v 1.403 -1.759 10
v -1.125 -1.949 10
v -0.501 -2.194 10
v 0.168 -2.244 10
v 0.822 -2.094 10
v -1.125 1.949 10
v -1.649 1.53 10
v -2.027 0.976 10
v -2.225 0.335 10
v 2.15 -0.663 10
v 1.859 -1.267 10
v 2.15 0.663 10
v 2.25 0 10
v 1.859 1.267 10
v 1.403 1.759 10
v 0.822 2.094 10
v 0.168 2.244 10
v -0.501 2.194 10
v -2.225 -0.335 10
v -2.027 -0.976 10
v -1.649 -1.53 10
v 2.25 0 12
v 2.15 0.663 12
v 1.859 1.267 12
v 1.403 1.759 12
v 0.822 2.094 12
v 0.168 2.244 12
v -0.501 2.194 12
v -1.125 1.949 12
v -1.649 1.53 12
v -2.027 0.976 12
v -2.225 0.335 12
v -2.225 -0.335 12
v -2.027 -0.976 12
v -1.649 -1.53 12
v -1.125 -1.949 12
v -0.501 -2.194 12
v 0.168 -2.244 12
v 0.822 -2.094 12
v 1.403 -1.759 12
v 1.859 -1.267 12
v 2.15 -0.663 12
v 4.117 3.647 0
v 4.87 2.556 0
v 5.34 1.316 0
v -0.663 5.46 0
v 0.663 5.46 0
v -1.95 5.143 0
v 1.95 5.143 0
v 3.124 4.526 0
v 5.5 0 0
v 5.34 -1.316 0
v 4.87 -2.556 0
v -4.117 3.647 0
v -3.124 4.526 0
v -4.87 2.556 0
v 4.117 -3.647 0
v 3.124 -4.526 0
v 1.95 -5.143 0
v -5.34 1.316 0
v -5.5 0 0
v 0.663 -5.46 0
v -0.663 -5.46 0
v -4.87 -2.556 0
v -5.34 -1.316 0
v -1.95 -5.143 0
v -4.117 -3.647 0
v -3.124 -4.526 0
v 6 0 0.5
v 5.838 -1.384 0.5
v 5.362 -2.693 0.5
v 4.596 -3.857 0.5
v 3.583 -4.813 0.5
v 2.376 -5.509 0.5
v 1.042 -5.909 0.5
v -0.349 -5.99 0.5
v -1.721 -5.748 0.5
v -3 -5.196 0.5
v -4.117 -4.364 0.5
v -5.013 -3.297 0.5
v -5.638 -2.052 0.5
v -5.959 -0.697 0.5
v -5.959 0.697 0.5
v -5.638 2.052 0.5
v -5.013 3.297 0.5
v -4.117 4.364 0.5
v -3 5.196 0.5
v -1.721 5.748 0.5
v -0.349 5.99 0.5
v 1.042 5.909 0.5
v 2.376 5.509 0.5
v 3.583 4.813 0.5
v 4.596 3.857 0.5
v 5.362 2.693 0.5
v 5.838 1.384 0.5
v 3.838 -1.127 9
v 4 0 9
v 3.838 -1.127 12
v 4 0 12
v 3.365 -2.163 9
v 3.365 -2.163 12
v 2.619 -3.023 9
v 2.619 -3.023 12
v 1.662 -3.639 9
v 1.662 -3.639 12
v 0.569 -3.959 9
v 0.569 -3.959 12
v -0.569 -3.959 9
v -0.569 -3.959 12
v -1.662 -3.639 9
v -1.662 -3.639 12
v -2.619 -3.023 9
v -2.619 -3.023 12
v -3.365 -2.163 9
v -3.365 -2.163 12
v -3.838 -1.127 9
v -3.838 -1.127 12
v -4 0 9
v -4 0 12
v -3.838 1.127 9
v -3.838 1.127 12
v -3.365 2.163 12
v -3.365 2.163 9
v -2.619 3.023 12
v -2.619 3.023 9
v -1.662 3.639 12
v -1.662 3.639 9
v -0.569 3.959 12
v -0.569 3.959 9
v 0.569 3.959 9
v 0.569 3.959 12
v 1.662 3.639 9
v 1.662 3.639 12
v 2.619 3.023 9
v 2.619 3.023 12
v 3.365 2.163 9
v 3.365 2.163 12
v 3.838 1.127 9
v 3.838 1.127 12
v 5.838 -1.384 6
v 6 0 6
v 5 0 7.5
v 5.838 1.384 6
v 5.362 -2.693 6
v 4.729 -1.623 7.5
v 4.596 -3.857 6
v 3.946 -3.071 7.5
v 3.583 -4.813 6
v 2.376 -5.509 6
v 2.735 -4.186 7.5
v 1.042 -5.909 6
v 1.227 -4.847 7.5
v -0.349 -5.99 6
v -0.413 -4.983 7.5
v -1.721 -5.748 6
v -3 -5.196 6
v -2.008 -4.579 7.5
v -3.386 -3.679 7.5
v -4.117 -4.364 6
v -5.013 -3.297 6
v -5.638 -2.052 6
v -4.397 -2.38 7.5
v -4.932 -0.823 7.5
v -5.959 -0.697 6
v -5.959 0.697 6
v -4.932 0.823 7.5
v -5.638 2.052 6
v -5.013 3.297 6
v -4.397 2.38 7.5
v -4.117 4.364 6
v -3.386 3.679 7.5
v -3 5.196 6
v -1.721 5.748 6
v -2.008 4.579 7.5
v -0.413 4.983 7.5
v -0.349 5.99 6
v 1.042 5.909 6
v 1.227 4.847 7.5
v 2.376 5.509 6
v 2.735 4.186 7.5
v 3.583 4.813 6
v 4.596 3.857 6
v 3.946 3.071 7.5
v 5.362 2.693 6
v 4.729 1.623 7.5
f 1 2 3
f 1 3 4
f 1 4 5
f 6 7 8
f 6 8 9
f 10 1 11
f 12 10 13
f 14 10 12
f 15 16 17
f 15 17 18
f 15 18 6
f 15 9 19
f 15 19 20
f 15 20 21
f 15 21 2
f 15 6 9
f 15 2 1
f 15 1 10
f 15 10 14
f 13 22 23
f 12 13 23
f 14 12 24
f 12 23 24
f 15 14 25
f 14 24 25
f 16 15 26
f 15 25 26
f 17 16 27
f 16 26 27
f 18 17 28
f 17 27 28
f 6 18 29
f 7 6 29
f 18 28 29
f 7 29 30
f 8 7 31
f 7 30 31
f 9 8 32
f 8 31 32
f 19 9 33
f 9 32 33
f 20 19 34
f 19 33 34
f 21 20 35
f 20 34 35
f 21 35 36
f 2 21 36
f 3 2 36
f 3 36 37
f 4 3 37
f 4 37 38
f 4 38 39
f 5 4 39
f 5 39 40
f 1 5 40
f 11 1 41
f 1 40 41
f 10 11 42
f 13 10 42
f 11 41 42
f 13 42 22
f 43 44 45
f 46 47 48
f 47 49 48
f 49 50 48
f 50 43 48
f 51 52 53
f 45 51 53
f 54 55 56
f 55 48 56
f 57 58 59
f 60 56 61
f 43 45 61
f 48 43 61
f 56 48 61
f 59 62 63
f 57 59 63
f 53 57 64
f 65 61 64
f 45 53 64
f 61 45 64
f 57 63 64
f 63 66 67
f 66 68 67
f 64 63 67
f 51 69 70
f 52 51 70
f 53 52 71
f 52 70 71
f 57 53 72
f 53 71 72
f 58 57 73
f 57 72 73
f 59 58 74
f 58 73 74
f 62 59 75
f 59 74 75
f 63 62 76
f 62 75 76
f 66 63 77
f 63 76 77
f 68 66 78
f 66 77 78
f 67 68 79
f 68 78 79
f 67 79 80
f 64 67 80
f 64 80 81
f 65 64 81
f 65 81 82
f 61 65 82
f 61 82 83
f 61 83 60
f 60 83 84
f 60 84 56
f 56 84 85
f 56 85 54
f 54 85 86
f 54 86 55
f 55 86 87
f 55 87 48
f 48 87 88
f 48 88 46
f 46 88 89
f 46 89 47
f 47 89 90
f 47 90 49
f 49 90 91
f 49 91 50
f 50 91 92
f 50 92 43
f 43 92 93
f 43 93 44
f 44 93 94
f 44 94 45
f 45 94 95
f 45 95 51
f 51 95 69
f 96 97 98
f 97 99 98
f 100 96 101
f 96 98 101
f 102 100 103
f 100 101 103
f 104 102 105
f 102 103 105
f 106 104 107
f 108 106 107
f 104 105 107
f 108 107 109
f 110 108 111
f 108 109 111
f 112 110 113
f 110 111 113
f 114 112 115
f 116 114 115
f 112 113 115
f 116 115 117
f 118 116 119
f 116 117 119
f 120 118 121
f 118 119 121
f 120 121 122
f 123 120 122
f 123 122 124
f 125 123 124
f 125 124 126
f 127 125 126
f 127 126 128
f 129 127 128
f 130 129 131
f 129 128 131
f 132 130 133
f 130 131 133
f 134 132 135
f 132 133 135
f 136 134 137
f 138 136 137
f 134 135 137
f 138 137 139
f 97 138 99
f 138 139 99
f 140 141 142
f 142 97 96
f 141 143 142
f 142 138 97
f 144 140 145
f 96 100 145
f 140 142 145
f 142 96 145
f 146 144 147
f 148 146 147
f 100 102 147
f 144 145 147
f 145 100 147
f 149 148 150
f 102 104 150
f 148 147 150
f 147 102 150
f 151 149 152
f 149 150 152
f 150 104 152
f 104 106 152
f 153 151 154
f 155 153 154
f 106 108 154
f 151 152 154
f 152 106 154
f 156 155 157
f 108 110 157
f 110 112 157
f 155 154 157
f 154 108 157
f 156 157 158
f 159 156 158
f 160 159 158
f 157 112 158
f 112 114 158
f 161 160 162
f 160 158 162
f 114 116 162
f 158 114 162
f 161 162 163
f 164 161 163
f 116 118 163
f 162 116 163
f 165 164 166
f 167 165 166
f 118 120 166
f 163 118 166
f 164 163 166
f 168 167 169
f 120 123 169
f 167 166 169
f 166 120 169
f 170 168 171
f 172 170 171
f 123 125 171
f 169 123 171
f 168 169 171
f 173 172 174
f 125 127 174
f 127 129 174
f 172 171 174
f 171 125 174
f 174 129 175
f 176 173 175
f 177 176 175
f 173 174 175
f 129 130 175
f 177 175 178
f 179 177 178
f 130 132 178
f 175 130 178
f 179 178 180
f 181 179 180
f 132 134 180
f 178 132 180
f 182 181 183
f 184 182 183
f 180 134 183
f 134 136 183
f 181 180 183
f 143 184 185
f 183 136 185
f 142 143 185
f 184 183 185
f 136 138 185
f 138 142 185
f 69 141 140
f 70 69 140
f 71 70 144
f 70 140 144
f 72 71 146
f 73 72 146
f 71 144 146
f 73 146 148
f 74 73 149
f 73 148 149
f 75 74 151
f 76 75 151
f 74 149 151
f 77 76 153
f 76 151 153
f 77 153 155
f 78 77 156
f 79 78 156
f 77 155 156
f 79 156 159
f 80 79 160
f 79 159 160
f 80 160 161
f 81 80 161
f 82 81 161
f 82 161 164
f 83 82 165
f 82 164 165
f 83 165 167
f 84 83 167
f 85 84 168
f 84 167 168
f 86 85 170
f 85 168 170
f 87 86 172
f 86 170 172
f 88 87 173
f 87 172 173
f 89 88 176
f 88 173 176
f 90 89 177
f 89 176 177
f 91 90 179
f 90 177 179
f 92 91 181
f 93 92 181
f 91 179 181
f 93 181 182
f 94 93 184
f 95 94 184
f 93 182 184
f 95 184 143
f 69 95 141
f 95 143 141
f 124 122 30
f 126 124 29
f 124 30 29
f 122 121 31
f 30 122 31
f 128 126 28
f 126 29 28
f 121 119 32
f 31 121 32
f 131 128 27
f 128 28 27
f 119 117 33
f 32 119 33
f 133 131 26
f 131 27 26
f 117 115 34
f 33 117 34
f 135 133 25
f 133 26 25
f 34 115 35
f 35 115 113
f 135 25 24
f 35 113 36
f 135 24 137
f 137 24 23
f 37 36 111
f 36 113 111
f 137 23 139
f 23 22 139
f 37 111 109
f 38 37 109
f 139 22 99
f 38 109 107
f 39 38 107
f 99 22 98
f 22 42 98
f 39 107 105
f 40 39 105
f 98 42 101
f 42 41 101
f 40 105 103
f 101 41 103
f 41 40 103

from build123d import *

# Parameters (mm, degrees)
F2_R     = 2.25
F3_DEPTH = 2
F4_SIZE  = 0.5


with BuildPart() as f1:
    # F0 (on Front) → F1 (revolve)
    with BuildSketch(Plane.XZ):
        Polygon((0, 12), (0, 0), (6, 0), (6, 6), (4, 9), (4, 12), align=None)
    revolve(axis=Axis((0, 0, 6), (0, 0, -1)))

    # F2 (on face) → F3 (cut)
    with BuildSketch(Plane.XY.offset(12)):
        Circle(F2_R)
    extrude(amount=-F3_DEPTH, mode=Mode.SUBTRACT)

    # F4
    f4_edges = [f1.edges().sort_by_distance(p)[0] for p in [
        (-6, 0, 0),
    ]]
    chamfer(f4_edges, length=F4_SIZE)


solid = f1.part
